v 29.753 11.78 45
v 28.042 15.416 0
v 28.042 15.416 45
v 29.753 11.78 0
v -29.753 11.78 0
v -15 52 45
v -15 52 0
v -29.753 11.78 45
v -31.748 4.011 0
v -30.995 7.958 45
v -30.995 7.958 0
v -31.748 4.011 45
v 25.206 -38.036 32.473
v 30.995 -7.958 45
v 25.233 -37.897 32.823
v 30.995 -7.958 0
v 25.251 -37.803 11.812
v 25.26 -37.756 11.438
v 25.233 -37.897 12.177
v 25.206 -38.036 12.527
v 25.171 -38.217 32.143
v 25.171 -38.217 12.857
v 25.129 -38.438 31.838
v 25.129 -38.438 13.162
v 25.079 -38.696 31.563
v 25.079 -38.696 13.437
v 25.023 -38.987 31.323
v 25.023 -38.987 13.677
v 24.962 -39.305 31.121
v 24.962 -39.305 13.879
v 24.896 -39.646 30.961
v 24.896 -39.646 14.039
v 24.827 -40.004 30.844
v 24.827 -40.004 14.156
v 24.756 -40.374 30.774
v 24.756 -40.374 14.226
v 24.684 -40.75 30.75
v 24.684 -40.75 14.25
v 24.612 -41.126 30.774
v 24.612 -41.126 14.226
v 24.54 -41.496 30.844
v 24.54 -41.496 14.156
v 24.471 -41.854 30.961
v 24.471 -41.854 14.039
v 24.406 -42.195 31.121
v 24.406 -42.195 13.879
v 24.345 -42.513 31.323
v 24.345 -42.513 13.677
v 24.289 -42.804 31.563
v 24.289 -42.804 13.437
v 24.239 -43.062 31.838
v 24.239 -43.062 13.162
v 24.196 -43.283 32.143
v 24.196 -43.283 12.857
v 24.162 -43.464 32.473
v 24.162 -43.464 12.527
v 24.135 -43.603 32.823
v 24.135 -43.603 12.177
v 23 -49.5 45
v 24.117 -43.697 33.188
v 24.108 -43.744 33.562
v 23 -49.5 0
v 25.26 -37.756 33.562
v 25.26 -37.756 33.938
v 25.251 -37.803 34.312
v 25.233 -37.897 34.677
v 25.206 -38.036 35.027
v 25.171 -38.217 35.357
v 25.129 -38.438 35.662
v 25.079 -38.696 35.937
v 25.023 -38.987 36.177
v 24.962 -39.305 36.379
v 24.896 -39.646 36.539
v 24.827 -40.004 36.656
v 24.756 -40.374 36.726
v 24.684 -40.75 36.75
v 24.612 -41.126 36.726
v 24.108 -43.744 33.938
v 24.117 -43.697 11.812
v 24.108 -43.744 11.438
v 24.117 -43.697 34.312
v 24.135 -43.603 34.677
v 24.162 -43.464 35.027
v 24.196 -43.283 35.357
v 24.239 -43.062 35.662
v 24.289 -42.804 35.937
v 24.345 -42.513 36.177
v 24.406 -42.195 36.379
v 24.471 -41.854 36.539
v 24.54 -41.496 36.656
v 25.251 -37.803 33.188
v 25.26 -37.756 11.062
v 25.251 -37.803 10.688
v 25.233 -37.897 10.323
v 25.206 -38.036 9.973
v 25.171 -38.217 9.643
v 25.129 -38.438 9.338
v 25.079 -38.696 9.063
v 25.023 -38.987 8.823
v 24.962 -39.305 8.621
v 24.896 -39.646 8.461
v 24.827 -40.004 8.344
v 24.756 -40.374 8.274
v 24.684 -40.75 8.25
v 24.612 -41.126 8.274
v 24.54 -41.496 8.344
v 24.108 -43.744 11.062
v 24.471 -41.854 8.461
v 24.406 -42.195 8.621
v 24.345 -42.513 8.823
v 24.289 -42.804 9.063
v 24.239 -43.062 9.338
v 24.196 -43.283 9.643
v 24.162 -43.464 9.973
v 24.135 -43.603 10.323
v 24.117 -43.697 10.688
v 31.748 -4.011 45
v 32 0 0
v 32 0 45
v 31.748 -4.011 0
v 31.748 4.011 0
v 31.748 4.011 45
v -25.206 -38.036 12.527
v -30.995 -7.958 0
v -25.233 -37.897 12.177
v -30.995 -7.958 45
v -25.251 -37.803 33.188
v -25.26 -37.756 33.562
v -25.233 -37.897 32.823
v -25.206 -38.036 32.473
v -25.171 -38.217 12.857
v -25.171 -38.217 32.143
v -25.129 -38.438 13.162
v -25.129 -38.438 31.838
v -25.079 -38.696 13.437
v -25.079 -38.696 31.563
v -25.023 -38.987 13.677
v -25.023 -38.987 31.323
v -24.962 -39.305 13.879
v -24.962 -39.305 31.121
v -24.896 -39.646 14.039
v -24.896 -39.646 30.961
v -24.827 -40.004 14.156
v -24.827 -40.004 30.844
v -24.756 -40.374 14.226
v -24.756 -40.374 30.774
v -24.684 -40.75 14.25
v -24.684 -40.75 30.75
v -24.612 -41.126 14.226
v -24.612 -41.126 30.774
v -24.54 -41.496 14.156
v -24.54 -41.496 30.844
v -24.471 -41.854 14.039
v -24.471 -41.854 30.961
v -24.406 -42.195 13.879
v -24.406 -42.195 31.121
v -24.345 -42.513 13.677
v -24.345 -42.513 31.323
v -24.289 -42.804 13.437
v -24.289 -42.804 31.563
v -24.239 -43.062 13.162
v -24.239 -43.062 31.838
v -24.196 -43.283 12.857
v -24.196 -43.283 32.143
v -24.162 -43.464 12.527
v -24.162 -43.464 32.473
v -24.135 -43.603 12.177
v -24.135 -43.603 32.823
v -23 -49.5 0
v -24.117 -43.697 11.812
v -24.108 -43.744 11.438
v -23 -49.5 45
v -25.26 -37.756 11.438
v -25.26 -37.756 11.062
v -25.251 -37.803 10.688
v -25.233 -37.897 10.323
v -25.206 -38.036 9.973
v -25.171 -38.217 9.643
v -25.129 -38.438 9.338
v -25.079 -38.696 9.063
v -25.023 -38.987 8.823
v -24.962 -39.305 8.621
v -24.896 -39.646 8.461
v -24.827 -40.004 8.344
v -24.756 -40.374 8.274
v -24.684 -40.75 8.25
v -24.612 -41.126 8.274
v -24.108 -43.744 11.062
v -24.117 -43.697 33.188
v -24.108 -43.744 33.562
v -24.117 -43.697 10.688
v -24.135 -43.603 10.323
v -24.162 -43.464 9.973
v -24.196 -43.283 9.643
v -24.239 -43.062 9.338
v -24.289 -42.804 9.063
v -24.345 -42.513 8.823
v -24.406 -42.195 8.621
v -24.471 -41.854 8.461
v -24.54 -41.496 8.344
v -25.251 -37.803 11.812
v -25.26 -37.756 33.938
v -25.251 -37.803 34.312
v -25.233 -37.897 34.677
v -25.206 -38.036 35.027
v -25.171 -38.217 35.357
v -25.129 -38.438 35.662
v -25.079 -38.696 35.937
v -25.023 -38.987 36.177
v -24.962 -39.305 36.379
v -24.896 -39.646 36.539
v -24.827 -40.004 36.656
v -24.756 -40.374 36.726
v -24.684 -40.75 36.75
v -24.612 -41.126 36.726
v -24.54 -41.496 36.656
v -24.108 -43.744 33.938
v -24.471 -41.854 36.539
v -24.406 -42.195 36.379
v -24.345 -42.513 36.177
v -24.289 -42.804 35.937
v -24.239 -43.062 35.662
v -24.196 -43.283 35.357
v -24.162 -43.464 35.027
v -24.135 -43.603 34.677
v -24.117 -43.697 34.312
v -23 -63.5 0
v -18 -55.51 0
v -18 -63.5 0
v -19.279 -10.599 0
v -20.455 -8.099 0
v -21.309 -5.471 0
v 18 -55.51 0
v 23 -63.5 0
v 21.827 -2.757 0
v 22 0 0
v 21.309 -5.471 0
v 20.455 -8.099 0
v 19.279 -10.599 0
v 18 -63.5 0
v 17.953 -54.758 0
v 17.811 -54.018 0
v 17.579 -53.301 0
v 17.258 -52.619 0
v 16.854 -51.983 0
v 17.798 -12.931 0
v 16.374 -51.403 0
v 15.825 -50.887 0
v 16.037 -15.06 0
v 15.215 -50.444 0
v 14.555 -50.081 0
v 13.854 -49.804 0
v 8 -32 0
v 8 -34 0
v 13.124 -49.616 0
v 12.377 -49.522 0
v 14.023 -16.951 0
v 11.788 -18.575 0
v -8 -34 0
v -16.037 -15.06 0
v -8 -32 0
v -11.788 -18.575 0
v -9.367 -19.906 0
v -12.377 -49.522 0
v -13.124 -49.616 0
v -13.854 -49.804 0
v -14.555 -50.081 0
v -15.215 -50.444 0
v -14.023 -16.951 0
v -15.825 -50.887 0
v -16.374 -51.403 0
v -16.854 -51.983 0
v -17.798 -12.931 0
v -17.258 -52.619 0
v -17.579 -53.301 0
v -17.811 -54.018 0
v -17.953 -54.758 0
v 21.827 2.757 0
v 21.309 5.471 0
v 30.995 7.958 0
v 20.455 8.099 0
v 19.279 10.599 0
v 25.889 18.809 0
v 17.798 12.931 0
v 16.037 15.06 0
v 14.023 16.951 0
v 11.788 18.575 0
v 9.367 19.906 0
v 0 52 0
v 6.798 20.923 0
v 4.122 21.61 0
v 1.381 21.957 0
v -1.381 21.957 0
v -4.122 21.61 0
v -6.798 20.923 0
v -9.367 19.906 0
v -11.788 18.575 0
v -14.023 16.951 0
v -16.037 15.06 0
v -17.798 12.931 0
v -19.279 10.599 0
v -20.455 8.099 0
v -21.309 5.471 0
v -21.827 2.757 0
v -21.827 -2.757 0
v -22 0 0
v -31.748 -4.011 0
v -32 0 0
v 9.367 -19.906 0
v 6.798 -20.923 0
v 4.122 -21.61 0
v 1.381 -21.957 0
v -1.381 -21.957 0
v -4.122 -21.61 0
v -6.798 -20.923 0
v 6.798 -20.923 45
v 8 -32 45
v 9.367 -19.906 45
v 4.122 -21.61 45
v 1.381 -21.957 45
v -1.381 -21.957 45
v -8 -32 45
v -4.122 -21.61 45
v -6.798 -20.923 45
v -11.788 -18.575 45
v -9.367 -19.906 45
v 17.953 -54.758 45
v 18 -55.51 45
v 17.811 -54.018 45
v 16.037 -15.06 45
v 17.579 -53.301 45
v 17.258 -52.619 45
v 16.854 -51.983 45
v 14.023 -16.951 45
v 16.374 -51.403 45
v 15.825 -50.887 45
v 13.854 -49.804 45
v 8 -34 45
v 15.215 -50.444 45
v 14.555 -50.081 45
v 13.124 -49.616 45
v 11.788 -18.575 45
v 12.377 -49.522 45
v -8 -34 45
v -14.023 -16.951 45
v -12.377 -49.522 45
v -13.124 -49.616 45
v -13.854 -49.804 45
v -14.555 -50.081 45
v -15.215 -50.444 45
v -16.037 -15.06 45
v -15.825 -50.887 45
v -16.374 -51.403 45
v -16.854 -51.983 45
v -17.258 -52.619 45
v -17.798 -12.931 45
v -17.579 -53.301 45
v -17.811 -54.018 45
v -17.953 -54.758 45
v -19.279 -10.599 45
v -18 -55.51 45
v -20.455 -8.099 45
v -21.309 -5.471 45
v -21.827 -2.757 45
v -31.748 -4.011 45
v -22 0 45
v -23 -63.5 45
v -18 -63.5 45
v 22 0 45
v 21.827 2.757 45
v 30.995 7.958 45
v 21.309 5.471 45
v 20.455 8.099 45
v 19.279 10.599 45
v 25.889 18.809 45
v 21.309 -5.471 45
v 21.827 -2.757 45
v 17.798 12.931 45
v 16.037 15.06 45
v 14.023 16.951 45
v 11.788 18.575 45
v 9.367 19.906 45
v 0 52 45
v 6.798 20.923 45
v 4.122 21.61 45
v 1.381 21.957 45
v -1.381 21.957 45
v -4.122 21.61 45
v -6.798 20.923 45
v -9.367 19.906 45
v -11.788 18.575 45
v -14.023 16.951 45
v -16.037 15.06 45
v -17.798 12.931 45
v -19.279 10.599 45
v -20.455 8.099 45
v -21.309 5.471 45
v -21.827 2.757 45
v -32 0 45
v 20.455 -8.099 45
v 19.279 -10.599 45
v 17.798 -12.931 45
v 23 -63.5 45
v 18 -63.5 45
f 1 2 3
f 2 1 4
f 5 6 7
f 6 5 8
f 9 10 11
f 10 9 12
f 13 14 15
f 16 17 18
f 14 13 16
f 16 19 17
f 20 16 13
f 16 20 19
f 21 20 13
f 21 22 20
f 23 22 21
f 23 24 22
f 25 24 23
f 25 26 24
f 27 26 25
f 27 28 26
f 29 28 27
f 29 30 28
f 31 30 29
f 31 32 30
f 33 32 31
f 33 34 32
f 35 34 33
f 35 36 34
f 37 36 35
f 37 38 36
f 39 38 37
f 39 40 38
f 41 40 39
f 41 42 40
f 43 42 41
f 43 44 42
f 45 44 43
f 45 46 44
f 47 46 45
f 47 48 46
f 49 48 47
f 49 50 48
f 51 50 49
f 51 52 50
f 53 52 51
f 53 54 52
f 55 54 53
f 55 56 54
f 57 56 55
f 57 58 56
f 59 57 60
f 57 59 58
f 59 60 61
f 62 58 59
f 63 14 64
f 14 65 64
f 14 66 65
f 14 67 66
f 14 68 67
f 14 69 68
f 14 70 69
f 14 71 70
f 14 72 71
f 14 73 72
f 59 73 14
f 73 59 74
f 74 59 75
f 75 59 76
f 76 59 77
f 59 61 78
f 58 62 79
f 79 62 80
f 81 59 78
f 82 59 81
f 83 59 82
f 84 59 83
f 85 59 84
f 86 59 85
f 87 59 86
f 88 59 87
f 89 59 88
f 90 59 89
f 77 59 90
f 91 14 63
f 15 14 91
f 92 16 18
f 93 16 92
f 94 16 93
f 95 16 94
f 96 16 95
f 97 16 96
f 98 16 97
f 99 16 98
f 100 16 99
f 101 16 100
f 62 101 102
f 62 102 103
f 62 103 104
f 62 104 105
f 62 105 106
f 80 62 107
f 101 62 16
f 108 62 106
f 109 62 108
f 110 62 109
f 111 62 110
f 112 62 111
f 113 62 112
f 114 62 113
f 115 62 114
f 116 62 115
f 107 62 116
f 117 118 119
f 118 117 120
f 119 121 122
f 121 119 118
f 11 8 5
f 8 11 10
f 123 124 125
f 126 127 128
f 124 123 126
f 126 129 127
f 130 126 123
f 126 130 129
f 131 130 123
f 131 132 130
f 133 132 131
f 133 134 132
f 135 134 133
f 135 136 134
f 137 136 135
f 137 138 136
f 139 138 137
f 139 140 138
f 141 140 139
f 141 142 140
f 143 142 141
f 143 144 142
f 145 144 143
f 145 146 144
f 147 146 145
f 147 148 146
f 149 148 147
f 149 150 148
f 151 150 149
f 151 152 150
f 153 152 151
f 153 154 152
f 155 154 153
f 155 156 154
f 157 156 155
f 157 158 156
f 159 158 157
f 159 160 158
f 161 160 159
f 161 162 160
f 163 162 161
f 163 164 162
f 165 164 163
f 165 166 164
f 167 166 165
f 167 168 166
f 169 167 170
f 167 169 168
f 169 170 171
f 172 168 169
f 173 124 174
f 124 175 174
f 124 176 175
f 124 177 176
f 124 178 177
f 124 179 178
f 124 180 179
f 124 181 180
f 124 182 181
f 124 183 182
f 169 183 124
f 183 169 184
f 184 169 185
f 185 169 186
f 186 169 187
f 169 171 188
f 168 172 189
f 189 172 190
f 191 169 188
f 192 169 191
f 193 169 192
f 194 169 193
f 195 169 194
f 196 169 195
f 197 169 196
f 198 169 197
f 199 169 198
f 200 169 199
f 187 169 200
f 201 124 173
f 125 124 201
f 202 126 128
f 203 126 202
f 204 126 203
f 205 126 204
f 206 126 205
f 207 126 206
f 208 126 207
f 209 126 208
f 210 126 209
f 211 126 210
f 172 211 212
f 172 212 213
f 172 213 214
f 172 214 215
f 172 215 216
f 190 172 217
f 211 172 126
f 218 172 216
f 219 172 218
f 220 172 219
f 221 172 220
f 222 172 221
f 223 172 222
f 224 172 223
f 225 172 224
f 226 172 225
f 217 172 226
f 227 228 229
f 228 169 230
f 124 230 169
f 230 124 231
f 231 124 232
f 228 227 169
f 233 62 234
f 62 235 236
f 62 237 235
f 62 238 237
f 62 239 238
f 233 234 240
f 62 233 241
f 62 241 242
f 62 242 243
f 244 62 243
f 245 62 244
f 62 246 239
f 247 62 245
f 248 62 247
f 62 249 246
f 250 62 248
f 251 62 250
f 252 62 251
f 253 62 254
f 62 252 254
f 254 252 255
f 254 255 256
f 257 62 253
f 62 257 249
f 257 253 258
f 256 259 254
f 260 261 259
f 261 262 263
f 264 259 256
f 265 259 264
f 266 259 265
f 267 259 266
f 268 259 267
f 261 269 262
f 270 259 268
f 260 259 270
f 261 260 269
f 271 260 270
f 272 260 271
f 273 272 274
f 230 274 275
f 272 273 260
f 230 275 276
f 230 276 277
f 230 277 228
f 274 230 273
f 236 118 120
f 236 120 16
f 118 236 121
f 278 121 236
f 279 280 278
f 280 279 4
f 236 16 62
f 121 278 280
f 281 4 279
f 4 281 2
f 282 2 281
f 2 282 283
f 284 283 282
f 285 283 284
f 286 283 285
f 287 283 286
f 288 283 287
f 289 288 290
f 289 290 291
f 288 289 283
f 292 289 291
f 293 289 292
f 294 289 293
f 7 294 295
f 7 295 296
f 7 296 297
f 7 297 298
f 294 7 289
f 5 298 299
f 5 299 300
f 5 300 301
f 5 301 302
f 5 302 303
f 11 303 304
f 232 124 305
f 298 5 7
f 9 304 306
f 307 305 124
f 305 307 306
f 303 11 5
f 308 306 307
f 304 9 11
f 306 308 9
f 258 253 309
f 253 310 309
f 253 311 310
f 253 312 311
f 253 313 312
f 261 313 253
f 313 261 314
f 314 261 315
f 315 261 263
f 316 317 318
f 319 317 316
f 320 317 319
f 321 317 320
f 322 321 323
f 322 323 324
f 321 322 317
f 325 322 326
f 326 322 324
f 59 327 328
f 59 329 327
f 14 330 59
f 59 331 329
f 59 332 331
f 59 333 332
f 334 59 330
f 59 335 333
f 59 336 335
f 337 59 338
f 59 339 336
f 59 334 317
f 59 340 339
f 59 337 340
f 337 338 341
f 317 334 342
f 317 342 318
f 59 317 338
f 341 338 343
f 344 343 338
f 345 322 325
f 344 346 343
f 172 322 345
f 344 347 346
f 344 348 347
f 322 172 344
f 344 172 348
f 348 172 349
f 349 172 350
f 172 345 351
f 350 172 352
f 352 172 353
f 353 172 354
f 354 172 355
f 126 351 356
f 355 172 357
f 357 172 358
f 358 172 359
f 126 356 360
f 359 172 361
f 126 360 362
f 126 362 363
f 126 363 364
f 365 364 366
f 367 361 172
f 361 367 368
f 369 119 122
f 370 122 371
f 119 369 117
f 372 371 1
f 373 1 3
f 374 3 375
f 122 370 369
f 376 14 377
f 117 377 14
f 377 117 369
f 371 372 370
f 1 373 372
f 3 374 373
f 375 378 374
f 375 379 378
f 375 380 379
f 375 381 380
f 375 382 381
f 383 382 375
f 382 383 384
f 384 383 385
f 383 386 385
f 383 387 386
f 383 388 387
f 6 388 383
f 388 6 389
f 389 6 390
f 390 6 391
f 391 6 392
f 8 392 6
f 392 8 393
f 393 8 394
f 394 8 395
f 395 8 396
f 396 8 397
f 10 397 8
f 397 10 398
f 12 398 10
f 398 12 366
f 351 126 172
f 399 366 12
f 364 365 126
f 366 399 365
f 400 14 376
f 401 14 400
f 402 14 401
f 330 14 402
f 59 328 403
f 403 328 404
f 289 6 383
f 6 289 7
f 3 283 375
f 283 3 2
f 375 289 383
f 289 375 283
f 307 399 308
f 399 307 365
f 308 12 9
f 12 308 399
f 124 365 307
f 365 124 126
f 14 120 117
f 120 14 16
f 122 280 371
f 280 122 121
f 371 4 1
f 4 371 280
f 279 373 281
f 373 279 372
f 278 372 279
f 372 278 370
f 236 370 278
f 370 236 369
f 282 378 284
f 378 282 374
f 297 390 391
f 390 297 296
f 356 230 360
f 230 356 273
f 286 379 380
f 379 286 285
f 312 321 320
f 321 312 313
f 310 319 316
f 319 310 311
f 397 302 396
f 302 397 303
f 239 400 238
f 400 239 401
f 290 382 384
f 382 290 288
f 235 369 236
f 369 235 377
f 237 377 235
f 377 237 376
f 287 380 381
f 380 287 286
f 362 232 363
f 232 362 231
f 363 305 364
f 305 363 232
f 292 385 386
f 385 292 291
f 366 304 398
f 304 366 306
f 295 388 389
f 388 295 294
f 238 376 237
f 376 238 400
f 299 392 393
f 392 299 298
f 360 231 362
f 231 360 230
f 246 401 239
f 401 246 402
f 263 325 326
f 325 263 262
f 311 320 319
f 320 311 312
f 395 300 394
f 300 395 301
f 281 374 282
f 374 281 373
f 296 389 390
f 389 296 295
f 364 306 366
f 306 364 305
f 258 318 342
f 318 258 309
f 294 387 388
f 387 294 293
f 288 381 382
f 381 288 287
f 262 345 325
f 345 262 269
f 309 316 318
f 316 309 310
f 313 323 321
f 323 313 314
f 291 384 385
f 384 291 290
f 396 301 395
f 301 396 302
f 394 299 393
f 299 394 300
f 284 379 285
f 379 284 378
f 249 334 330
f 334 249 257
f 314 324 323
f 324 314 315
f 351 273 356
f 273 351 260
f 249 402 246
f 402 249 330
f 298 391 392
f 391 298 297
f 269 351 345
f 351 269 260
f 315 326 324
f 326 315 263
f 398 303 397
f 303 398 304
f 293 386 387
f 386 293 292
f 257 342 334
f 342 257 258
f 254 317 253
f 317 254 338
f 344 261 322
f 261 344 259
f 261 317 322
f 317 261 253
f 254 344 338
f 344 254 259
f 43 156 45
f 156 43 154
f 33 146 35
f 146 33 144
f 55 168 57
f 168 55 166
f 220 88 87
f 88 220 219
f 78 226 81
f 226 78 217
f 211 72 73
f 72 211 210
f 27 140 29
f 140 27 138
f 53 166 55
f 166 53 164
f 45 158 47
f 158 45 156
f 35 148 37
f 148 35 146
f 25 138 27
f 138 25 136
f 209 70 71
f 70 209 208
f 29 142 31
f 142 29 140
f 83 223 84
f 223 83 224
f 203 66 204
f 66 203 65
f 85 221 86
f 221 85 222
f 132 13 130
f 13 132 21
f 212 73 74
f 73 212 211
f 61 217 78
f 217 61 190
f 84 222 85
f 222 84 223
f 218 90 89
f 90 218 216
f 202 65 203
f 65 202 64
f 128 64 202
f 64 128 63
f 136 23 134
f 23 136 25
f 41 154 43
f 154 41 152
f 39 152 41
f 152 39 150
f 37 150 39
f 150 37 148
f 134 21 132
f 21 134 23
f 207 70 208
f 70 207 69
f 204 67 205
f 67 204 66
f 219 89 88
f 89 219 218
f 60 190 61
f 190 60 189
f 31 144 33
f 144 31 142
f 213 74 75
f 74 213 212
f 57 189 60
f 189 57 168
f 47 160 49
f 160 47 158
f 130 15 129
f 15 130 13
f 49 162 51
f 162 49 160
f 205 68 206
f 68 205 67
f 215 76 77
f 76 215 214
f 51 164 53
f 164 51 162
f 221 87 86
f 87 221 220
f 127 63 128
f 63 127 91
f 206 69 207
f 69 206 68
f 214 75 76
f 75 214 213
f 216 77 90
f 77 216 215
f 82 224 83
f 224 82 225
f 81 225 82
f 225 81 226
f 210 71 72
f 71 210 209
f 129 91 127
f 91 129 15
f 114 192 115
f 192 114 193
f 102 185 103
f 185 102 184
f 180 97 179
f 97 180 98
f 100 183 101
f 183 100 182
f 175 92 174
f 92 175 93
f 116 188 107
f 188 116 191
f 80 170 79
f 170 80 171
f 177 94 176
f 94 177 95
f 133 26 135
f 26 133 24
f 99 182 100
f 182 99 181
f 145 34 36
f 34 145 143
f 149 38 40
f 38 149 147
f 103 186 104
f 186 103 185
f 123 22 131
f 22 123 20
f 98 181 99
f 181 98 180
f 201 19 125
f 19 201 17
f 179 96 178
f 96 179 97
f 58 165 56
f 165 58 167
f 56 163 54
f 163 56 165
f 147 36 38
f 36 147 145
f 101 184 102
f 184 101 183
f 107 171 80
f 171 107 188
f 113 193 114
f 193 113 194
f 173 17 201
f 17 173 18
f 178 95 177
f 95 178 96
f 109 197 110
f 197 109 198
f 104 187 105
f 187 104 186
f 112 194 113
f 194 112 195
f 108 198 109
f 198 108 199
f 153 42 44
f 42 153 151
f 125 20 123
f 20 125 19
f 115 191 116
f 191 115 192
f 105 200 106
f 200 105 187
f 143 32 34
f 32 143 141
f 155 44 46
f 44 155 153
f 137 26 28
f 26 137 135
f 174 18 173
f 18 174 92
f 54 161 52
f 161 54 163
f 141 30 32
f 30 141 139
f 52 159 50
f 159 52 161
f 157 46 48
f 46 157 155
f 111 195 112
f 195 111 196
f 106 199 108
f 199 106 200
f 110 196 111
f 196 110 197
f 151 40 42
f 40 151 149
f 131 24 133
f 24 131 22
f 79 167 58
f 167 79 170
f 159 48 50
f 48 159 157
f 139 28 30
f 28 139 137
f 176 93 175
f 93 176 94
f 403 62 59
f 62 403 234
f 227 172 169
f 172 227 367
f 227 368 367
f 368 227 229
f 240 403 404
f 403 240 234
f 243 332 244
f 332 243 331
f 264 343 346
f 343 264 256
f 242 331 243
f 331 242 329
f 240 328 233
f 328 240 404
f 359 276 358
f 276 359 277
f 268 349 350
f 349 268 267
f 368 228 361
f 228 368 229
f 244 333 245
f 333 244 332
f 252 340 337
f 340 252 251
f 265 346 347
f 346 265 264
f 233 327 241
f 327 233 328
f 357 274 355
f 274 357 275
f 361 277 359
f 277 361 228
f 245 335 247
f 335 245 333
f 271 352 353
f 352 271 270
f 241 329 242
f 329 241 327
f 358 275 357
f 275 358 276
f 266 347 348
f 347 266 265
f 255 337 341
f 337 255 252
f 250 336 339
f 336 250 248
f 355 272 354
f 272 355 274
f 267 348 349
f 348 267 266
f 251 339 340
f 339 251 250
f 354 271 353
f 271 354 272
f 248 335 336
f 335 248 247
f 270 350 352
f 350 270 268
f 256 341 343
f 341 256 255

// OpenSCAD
// cowbell cam follower pivot

camFollowerTipWidth=15;
camFollowerTipHeight=20;

pivotInsideDia=44;

pivotWallThickness=10;

pivotOutsideDia=pivotInsideDia+pivotWallThickness*2;

followerWidth=45;
boltHoleDia=6;

cowbellHangerThickness=16;
cowbellHangarMetalThickness=2;

cowbellHangarOpeningHeight= 17.5;

cowbellHandleBlockOverHangThickness=15;
cowbellHandleBlockThickness=cowbellHangerThickness+2*cowbellHandleBlockOverHangThickness;


// Used to create a block that supports/braces the top of the bell a bit
cowbellTopOverHangDepth=14;
cowbellTopFlatThickness=24;
cowbellTopCornerRadius=6;
cowbellTopThickness=cowbellTopFlatThickness+cowbellTopCornerRadius*2;

overlap=0.01;
$fn=50;

// TODO: create two other objects that are cut pieces of this one.

union() {
    difference() {
        hull() {
            // cam follower tip
            translate([-camFollowerTipWidth,pivotOutsideDia/2,0])
                cube([camFollowerTipWidth,camFollowerTipHeight,followerWidth]);
            // pivot
            cylinder(d=pivotOutsideDia, h=followerWidth);
            // block to hold the cowbell
            translate([-cowbellHandleBlockThickness/2,-pivotOutsideDia/2-cowbellHangarOpeningHeight,0])
                cube([cowbellHandleBlockThickness,cowbellHangarOpeningHeight,followerWidth]);
            
        }
        // pivot opening
        translate([0,0,-overlap])
            cylinder(d=pivotInsideDia, h=followerWidth+overlap*2);
        // slot for hanger to pass through
        translate([-cowbellHangerThickness/2,-pivotOutsideDia/2-cowbellHangarMetalThickness,-overlap])
            cube([cowbellHangerThickness,cowbellHangarMetalThickness,followerWidth+overlap*2]);
        
        // bolt hole 1
        translate([0,
                -pivotOutsideDia/2-cowbellHangarOpeningHeight/2,
                followerWidth*3/4])
            rotate([0,90,0])
                cylinder(d=boltHoleDia, h=pivotOutsideDia+overlap*2, center=true);
        // bolt hole 2
        translate([0,
                -pivotOutsideDia/2-cowbellHangarOpeningHeight/2,
                followerWidth/4])
            rotate([0,90,0])
                cylinder(d=boltHoleDia, h=pivotOutsideDia+overlap*2, center=true);
        
    }
    translate([0,-pivotOutsideDia/2-cowbellHangarOpeningHeight-cowbellTopOverHangDepth,0])
        bellTopBraceBlock();
}

module bellTopBraceBlock() {
    difference() {
        translate([-cowbellHandleBlockThickness/2,0,0])
            cube([cowbellHandleBlockThickness,cowbellTopOverHangDepth,followerWidth]);
        translate([0,-overlap,-overlap])
        hull() {
            // front (right) side of bell
            translate([cowbellTopFlatThickness/2,cowbellTopOverHangDepth-cowbellTopCornerRadius,0])
                cylinder(r=cowbellTopCornerRadius, h=followerWidth+overlap*2);
            // back (left) side of bell
            translate([-cowbellTopFlatThickness/2,cowbellTopOverHangDepth-cowbellTopCornerRadius,0])
                cylinder(r=cowbellTopCornerRadius, h=followerWidth+overlap*2);
            translate([-cowbellTopFlatThickness/2-cowbellTopCornerRadius,0,0])
                cube([cowbellTopFlatThickness+cowbellTopCornerRadius*2,
                    cowbellTopOverHangDepth-cowbellTopCornerRadius,
                    followerWidth+overlap*2]);
        }
    }
}
